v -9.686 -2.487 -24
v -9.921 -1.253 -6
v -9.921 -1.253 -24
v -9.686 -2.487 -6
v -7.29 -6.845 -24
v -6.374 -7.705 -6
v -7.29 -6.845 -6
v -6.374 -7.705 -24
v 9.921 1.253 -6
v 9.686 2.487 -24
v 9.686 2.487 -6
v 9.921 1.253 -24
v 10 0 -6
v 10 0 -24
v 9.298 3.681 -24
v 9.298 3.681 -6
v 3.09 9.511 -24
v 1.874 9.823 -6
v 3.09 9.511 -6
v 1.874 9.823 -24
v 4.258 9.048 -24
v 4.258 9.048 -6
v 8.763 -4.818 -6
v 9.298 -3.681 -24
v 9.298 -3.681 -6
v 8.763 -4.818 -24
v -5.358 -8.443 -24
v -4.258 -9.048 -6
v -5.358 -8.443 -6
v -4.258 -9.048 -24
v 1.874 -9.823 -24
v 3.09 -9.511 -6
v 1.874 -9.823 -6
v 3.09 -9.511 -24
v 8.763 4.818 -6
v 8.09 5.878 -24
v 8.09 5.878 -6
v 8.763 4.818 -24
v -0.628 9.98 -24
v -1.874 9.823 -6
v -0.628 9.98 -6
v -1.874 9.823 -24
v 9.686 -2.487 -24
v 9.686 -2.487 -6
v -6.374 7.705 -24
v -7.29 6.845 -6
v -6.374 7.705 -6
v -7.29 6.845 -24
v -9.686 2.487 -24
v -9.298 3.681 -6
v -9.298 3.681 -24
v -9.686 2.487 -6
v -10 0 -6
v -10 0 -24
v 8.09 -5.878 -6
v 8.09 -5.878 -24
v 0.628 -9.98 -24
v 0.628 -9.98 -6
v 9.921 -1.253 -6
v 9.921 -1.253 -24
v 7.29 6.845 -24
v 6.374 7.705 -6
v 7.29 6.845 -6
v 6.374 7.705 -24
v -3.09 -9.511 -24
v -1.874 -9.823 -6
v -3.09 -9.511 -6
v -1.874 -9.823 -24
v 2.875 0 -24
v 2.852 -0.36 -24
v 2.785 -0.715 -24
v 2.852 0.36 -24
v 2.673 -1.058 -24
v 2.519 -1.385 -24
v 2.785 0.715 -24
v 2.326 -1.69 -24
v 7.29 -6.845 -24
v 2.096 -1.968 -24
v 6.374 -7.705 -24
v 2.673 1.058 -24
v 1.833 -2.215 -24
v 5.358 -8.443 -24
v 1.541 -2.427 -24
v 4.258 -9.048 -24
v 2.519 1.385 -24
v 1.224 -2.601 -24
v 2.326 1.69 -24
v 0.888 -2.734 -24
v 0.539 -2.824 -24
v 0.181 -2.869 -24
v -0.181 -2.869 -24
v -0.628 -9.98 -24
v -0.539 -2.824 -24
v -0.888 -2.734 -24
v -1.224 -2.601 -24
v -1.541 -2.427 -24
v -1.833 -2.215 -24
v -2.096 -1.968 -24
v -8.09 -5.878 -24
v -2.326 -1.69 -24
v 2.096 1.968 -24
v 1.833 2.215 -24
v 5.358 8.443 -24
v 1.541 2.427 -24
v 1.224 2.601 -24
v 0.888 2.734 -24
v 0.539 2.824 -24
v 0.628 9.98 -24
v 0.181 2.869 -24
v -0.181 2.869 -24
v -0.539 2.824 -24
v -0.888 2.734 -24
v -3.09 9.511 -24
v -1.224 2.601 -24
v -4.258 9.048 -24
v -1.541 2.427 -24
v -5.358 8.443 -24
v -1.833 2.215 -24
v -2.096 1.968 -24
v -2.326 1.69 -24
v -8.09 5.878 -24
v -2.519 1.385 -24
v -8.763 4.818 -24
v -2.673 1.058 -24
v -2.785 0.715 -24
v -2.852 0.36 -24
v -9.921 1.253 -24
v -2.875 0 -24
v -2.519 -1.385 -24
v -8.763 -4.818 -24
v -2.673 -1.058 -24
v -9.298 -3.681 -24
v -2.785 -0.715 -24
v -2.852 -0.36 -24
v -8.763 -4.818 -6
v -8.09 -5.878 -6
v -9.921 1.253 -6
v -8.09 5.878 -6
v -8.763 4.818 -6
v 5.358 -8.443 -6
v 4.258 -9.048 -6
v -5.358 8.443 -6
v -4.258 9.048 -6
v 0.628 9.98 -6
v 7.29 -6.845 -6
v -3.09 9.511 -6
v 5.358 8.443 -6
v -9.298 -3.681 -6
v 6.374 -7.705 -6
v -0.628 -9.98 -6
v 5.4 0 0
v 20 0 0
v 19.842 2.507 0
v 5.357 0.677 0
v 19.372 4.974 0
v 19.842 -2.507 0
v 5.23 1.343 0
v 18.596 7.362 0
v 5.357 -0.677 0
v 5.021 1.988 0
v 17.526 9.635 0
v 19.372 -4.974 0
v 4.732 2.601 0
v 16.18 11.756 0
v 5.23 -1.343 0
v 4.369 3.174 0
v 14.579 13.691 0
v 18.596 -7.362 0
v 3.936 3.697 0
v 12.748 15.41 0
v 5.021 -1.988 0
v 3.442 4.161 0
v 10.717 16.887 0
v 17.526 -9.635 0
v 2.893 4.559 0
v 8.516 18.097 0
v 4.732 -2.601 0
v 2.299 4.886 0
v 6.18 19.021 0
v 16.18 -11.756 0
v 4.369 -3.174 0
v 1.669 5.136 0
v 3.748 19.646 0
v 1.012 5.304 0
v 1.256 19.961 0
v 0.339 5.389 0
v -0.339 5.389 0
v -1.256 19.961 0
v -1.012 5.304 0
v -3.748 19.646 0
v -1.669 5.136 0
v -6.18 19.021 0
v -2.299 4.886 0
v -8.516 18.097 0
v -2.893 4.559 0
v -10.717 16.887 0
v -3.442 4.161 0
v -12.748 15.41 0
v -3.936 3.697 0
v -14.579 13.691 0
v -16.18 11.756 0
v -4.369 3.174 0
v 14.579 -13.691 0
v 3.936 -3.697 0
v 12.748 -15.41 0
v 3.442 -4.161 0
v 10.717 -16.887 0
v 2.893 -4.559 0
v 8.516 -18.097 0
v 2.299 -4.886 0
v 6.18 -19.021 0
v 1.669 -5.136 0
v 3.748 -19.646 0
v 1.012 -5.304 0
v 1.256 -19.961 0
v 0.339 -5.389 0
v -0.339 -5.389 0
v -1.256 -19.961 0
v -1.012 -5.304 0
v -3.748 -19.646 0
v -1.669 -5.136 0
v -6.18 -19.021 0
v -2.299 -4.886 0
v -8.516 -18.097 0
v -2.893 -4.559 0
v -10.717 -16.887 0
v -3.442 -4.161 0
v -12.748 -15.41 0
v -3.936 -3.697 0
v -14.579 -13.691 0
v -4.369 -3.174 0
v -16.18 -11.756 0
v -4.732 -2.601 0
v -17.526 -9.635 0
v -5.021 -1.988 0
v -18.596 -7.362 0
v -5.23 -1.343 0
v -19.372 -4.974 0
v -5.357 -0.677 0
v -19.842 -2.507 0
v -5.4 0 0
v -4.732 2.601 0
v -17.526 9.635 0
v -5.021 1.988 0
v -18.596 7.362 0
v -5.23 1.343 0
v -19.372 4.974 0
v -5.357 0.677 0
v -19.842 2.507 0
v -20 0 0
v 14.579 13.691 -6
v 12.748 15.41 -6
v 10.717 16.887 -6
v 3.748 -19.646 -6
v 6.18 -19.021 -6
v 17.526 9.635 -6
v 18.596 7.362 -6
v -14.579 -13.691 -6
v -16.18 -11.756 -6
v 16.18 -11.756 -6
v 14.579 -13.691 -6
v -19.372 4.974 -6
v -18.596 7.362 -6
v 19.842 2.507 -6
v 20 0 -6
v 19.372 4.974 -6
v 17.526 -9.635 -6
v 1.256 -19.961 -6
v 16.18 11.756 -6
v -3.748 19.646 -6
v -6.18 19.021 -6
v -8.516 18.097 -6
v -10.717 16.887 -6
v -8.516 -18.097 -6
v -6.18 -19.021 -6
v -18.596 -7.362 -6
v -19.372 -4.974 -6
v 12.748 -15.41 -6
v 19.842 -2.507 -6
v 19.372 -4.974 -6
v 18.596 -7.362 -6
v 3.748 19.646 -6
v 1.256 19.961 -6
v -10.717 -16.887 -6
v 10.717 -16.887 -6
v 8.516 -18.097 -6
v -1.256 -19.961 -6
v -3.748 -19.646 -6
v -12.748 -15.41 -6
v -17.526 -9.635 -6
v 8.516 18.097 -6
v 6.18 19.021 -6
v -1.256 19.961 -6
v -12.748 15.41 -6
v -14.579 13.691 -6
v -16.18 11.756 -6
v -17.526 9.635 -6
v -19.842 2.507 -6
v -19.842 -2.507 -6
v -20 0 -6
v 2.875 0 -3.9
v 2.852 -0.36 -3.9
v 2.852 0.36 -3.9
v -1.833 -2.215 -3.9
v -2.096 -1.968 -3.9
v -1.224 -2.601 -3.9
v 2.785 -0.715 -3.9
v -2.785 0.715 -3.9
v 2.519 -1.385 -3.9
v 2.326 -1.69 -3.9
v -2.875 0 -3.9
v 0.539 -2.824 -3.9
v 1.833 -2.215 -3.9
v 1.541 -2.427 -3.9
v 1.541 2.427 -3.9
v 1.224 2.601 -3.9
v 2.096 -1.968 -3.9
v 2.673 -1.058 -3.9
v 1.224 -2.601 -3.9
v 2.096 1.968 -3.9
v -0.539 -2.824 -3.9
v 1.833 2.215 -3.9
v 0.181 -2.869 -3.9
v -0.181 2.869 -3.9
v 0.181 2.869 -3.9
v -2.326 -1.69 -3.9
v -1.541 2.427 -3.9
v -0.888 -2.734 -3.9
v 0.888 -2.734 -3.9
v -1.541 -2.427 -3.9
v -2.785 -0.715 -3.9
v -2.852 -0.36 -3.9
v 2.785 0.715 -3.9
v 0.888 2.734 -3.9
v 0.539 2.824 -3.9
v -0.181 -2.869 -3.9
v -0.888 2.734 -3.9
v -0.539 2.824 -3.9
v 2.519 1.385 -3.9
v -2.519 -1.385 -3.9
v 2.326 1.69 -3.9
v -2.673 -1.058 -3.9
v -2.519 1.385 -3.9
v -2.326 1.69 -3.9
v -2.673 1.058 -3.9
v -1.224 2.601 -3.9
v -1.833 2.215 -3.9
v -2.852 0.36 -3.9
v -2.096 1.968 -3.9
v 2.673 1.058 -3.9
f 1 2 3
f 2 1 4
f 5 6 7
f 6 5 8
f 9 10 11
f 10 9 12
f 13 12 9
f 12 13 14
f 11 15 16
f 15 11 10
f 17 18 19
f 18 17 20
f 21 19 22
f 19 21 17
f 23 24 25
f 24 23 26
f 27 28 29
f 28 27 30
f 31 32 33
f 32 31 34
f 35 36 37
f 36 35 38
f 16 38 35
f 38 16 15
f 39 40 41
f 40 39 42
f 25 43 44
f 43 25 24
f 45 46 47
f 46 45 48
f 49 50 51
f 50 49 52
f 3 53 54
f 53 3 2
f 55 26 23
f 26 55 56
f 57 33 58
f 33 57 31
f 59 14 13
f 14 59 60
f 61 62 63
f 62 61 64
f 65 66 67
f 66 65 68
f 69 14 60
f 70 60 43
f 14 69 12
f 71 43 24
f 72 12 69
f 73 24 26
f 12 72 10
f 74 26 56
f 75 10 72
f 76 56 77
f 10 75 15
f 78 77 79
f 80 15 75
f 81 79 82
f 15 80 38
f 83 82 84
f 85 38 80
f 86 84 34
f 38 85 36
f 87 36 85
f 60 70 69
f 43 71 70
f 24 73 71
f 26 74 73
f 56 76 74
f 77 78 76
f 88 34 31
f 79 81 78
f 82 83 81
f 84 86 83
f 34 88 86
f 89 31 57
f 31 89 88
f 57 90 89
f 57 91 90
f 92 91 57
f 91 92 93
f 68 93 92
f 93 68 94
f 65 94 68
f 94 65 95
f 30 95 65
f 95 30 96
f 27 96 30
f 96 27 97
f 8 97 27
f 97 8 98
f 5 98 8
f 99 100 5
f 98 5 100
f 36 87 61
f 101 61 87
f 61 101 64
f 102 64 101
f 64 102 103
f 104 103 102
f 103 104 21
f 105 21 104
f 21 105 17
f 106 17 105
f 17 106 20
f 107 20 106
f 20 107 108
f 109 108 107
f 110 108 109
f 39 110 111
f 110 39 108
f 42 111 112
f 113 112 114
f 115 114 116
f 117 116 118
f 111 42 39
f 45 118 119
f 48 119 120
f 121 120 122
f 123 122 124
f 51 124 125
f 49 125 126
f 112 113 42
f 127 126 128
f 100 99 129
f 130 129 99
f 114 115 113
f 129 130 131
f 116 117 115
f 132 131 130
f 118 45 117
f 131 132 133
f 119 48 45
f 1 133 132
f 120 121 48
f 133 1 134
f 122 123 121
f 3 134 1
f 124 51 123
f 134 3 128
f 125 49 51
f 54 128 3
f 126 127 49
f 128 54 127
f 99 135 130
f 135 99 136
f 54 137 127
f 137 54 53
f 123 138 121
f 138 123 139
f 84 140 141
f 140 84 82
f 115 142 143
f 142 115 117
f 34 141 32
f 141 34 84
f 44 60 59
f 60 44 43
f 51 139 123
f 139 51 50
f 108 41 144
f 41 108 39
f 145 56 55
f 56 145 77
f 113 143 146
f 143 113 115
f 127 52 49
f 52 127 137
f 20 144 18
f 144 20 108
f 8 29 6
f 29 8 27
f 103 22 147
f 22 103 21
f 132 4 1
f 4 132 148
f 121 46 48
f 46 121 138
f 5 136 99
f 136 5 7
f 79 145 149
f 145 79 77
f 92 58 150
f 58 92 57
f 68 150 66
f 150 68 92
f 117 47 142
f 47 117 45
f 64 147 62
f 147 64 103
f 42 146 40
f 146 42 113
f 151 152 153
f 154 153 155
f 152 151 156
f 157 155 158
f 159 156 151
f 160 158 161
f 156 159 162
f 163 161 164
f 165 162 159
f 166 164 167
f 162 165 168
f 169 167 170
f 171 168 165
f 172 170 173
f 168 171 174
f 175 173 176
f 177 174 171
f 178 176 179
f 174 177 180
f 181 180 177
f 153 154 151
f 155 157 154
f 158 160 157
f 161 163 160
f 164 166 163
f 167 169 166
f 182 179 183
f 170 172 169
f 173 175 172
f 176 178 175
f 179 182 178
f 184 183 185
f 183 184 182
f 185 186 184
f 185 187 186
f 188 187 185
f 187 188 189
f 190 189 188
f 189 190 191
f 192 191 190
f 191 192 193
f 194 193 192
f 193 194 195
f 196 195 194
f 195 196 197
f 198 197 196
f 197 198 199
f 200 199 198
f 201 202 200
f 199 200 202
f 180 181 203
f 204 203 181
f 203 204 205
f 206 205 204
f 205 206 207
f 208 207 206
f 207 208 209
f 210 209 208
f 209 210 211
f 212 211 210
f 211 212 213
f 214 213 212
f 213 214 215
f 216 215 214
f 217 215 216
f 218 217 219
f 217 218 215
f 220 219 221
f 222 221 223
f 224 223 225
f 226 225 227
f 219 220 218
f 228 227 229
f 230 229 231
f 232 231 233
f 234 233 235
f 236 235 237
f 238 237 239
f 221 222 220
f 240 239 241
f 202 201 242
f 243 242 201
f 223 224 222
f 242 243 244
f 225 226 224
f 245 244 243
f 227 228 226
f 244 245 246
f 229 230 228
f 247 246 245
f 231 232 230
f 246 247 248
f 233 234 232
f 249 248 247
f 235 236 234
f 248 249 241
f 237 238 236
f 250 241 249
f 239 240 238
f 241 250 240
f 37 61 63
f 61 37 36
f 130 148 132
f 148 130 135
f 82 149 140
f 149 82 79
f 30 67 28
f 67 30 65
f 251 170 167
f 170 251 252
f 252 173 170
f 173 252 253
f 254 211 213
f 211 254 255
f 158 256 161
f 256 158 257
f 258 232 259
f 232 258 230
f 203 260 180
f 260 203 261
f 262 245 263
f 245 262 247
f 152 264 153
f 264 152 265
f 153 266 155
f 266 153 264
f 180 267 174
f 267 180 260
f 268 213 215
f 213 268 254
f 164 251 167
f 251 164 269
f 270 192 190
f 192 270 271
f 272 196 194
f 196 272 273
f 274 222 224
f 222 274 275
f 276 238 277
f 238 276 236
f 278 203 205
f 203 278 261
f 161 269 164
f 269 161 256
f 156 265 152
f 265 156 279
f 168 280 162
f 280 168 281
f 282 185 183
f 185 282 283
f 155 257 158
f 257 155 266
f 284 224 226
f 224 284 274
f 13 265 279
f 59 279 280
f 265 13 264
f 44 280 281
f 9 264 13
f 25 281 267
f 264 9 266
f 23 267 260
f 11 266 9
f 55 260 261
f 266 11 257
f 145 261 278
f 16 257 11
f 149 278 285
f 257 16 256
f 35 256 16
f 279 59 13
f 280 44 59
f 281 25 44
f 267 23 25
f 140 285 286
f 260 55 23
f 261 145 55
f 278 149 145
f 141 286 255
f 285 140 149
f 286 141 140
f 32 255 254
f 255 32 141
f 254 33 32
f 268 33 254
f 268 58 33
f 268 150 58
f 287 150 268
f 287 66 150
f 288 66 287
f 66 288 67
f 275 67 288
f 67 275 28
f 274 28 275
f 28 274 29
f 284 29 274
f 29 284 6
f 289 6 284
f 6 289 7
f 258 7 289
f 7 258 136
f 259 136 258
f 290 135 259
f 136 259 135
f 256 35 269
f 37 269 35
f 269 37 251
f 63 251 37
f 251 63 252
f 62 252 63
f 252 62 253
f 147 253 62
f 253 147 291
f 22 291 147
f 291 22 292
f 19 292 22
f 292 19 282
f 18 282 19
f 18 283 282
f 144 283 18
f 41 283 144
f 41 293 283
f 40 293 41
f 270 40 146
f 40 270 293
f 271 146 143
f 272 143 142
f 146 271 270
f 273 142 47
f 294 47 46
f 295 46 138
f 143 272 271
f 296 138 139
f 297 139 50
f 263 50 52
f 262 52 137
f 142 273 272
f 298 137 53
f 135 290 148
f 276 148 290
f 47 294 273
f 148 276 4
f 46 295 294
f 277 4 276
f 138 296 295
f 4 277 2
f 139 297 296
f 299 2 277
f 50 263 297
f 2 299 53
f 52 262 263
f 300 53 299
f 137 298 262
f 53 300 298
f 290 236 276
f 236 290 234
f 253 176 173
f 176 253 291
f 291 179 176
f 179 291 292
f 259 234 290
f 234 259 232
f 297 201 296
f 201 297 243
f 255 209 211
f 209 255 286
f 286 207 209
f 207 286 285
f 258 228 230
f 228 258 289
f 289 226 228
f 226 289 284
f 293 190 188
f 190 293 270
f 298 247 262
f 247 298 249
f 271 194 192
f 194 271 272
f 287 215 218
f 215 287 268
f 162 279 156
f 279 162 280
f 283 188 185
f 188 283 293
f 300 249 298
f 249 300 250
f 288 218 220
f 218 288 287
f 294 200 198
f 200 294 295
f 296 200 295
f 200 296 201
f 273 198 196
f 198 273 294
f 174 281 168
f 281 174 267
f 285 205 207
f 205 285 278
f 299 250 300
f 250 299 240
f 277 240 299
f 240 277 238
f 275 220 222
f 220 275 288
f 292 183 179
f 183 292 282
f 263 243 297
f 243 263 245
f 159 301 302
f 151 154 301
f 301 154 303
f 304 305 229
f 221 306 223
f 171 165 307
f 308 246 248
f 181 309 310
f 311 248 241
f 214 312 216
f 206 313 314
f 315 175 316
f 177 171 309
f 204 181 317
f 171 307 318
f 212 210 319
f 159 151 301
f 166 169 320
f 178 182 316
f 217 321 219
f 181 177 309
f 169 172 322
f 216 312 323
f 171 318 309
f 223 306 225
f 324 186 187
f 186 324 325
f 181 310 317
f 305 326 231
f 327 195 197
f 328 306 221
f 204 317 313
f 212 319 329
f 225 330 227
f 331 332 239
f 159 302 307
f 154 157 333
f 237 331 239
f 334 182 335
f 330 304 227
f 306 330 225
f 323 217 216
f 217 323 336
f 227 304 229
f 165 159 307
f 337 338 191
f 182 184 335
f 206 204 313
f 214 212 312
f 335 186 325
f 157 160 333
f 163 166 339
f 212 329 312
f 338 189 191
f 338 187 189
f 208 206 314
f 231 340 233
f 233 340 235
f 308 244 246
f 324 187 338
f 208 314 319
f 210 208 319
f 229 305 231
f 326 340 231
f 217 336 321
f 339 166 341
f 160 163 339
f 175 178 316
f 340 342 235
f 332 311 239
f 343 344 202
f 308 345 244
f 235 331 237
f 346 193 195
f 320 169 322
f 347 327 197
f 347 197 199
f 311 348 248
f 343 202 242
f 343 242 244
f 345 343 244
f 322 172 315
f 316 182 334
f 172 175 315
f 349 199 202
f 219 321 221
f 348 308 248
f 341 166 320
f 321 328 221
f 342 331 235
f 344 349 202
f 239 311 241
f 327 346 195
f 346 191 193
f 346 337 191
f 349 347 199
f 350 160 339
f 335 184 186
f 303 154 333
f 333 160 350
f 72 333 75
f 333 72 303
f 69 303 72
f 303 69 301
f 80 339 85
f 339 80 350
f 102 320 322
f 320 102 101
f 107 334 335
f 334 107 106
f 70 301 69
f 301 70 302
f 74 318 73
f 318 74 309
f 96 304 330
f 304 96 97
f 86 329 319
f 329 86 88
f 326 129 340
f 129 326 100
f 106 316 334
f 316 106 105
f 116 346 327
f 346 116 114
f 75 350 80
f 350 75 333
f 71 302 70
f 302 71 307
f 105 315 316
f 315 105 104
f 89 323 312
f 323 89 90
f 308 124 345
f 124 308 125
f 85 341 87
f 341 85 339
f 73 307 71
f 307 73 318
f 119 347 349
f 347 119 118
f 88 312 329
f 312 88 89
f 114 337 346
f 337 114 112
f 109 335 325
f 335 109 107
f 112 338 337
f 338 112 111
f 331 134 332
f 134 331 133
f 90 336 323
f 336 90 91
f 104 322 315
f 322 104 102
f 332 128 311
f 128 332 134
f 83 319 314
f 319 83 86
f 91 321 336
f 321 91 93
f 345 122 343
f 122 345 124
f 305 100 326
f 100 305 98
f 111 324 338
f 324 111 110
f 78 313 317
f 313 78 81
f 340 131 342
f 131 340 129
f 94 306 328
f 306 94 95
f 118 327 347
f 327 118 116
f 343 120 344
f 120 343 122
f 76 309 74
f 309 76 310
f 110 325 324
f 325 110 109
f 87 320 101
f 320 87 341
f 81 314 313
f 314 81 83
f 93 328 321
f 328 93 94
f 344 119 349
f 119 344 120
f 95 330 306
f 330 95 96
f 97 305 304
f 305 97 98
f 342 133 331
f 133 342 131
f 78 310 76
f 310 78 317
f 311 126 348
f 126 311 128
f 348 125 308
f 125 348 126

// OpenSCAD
$fn = 50;


difference() {
	union() {
		translate(v = [0, 0, -24.0000000000]) {
			cylinder(h = 24, r = 10.0000000000);
		}
		translate(v = [0, 0, -6.0000000000]) {
			cylinder(h = 6, r = 20.0000000000);
		}
	}
	union() {
		translate(v = [0, 0, 0]) {
			rotate(a = [0, 0, 0]) {
				difference() {
					union() {
						#translate(v = [0, 0, -24.0000000000]) {
							cylinder(h = 24, r = 2.6000000000);
						}
						#translate(v = [0, 0, -3.9000000000]) {
							cylinder(h = 3.9000000000, r1 = 2.8750000000, r2 = 5.4000000000);
						}
						#translate(v = [0, 0, -24.0000000000]) {
							cylinder(h = 24, r = 2.8750000000);
						}
						#translate(v = [0, 0, -24.0000000000]) {
							cylinder(h = 24, r = 2.6000000000);
						}
					}
					union();
				}
			}
		}
	}
}
